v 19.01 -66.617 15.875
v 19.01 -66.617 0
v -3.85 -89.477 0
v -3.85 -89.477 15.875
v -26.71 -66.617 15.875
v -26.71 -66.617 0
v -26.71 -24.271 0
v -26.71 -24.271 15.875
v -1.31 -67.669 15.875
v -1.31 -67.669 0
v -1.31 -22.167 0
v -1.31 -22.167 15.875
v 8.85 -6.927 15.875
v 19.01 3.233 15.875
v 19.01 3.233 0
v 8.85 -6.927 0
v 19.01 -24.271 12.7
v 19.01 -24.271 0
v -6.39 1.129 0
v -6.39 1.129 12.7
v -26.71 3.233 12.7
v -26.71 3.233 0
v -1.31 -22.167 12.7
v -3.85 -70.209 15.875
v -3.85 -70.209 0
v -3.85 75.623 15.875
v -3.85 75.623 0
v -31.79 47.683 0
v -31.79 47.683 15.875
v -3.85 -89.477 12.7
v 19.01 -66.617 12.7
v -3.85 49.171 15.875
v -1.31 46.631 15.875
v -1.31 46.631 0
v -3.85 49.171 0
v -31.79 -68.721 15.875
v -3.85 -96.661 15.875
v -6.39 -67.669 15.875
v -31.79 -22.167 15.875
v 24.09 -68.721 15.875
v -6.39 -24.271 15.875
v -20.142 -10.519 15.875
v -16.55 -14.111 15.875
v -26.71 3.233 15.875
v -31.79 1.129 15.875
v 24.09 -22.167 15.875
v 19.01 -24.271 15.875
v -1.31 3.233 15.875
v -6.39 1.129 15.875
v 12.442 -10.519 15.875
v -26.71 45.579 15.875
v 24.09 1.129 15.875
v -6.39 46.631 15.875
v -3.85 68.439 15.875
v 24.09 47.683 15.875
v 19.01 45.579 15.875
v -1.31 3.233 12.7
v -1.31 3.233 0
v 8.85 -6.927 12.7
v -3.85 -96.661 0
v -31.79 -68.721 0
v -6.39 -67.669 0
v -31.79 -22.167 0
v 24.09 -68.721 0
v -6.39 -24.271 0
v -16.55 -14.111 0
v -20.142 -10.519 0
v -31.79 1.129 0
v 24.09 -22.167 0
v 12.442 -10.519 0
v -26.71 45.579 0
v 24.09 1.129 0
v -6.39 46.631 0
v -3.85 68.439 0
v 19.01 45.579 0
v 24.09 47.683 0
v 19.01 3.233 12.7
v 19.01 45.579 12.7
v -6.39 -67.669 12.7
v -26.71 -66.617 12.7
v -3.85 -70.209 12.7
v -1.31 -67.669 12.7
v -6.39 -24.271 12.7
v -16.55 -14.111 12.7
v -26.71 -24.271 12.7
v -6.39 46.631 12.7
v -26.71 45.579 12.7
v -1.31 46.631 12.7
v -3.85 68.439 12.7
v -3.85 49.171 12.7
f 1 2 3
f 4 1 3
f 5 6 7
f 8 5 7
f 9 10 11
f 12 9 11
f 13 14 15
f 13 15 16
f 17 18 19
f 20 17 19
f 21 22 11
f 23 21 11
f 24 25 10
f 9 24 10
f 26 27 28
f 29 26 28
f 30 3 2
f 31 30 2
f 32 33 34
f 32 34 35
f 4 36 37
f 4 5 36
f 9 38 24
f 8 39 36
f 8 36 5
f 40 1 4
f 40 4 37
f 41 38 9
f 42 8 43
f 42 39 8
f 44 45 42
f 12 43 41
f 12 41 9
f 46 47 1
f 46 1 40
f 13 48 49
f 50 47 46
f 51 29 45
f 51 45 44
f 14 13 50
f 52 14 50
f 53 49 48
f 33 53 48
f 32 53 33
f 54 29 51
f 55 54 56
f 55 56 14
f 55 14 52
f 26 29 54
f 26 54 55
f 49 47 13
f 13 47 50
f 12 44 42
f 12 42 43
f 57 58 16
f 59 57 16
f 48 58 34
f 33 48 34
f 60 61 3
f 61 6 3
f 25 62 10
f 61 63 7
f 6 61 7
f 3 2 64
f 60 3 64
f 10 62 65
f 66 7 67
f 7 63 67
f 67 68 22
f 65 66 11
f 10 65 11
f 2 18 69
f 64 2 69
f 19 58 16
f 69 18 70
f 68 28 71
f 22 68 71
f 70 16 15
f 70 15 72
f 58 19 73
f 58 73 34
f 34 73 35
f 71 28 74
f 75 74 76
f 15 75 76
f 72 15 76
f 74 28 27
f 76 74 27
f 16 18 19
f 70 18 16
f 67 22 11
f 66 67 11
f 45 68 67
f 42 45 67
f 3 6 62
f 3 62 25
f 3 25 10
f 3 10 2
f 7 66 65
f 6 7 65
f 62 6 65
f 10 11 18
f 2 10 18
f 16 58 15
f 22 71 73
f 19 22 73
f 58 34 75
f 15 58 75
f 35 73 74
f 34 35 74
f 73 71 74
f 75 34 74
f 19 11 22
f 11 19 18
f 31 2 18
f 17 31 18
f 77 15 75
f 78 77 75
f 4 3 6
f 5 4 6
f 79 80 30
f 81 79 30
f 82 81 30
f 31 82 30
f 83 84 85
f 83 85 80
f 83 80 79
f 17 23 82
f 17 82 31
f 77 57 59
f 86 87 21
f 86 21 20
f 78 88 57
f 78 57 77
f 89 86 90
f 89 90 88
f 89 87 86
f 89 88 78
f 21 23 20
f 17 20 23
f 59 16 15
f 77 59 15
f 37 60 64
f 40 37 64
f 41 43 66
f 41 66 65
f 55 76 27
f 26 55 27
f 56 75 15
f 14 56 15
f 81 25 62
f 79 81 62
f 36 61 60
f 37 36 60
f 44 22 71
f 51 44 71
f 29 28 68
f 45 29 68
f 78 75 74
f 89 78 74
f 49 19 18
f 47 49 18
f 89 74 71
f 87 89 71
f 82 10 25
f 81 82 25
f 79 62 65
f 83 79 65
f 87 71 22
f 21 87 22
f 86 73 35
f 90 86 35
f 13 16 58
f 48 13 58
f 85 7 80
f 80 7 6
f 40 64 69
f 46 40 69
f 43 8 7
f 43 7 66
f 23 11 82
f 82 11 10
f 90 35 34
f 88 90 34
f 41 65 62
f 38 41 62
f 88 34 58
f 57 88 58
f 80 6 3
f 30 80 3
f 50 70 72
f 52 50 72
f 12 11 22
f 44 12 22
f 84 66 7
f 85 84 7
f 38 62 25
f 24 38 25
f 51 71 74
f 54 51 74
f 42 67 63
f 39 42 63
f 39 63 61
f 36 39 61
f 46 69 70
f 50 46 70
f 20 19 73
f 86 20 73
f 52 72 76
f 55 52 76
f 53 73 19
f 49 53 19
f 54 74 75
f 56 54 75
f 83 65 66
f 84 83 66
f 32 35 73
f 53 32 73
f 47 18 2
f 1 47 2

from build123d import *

# Parameters (mm, degrees)
F1_DEPTH = 12.7
F3_DEPTH = 15.875


with BuildPart() as f1:
    # F0 (on Top) → F1 (new body)
    with BuildSketch(Plane.XY):
        Polygon((-6.3896695265, 1.1289265677), (-6.3896695265, 46.6310290162), (-3.8496695265, 49.1710290162), (-1.3096695265, 46.6310290162), (-1.3096695265, 3.2331314646), (8.8503304735, -6.9268685354), (19.0103304735, 3.2331314646), (19.0103304735, 45.5789265677), (-3.8496695265, 68.4389265677), (-26.7096695265, 45.5789265677), (-26.7096695265, 3.2331314646), (-1.3096695265, -22.1668685354), (-1.3096695265, -67.6689709838), (-3.8496695265, -70.2089709838), (-6.3896695265, -67.6689709838), (-6.3896695265, -24.2710734323), (-16.5496695265, -14.1110734323), (-26.7096695265, -24.2710734323), (-26.7096695265, -66.6168685354), (-3.8496695265, -89.4768685354), (19.0103304735, -66.6168685354), (19.0103304735, -24.2710734323), align=None)
    extrude(amount=F1_DEPTH)


with BuildPart() as f3:
    # F2 (on Top) → F3 (new body)
    with BuildSketch(Plane.XY):
        Polygon((-3.8496695265, 72.0310290162), (-29.2496695265, 46.6310290162), (-29.2496695265, 2.1810290162), (-18.3457207507, -8.7229197596), (-16.5496695265, -10.5189709838), (-18.3457207507, -12.315022208), (-29.2496695265, -23.2189709838), (-29.2496695265, -67.6689709838), (-3.8496695265, -93.0689709838), (21.5503304735, -67.6689709838), (21.5503304735, -23.2189709838), (10.6463816977, -12.315022208), (8.8503304735, -10.5189709838), (10.6463816977, -8.7229197596), (21.5503304735, 2.1810290162), (21.5503304735, 46.6310290162), align=None)
        Polygon((-3.8496695265, 2.1810290162), (-3.8496695265, 46.6310290162), (-6.3896695265, 46.6310290162), (-6.3896695265, 1.1289265677), (19.0103304735, -24.2710734323), (19.0103304735, -66.6168685354), (-3.8496695265, -89.4768685354), (-26.7096695265, -66.6168685354), (-26.7096695265, -24.2710734323), (-16.5496695265, -14.1110734323), (-14.7536183023, -12.315022208), (-3.8496695265, -23.2189709838), (-3.8496695265, -67.6689709838), (-1.3096695265, -67.6689709838), (-1.3096695265, -22.1668685354), (-26.7096695265, 3.2331314646), (-26.7096695265, 45.5789265677), (-3.8496695265, 68.4389265677), (19.0103304735, 45.5789265677), (19.0103304735, 3.2331314646), (8.8503304735, -6.9268685354), (7.0542792493, -8.7229197596), align=None, mode=Mode.SUBTRACT)
        Polygon((-29.2496695265, 2.1810290162), (-29.2496695265, 46.6310290162), (-3.8496695265, 72.0310290162), (21.5503304735, 46.6310290162), (21.5503304735, 2.1810290162), (10.6463816977, -8.7229197596), (12.442432922, -10.5189709838), (24.0903304735, 1.1289265677), (24.0903304735, 47.6831314646), (-3.8496695265, 75.6231314646), (-31.7896695265, 47.6831314646), (-31.7896695265, 1.1289265677), (-20.1417719749, -10.5189709838), (-18.3457207507, -8.7229197596), align=None)
        Polygon((-18.3457207507, -12.315022208), (-20.1417719749, -10.5189709838), (-31.7896695265, -22.1668685354), (-31.7896695265, -68.7210734323), (-3.8496695265, -96.6610734323), (24.0903304735, -68.7210734323), (24.0903304735, -22.1668685354), (12.442432922, -10.5189709838), (10.6463816977, -12.315022208), (21.5503304735, -23.2189709838), (21.5503304735, -67.6689709838), (-3.8496695265, -93.0689709838), (-29.2496695265, -67.6689709838), (-29.2496695265, -23.2189709838), align=None)
        Polygon((-14.7536183023, -12.315022208), (-16.5496695265, -14.1110734323), (-6.3896695265, -24.2710734323), (-6.3896695265, -67.6689709838), (-3.8496695265, -67.6689709838), (-3.8496695265, -23.2189709838), align=None)
        Polygon((-1.3096695265, 46.6310290162), (-3.8496695265, 46.6310290162), (-3.8496695265, 2.1810290162), (7.0542792493, -8.7229197596), (8.8503304735, -6.9268685354), (-1.3096695265, 3.2331314646), align=None)
        Polygon((-16.5496695265, -10.5189709838), (-18.3457207507, -8.7229197596), (-20.1417719749, -10.5189709838), (-18.3457207507, -12.315022208), align=None)
        Polygon((12.442432922, -10.5189709838), (10.6463816977, -8.7229197596), (8.8503304735, -10.5189709838), (10.6463816977, -12.315022208), align=None)
        Polygon((-6.3896695265, 46.6310290162), (-3.8496695265, 46.6310290162), (-1.3096695265, 46.6310290162), (-3.8496695265, 49.1710290162), align=None)
        Polygon((-3.8496695265, -70.2089709838), (-1.3096695265, -67.6689709838), (-3.8496695265, -67.6689709838), (-6.3896695265, -67.6689709838), align=None)
    extrude(amount=F3_DEPTH)


solid = Compound([f1.part, f3.part])
